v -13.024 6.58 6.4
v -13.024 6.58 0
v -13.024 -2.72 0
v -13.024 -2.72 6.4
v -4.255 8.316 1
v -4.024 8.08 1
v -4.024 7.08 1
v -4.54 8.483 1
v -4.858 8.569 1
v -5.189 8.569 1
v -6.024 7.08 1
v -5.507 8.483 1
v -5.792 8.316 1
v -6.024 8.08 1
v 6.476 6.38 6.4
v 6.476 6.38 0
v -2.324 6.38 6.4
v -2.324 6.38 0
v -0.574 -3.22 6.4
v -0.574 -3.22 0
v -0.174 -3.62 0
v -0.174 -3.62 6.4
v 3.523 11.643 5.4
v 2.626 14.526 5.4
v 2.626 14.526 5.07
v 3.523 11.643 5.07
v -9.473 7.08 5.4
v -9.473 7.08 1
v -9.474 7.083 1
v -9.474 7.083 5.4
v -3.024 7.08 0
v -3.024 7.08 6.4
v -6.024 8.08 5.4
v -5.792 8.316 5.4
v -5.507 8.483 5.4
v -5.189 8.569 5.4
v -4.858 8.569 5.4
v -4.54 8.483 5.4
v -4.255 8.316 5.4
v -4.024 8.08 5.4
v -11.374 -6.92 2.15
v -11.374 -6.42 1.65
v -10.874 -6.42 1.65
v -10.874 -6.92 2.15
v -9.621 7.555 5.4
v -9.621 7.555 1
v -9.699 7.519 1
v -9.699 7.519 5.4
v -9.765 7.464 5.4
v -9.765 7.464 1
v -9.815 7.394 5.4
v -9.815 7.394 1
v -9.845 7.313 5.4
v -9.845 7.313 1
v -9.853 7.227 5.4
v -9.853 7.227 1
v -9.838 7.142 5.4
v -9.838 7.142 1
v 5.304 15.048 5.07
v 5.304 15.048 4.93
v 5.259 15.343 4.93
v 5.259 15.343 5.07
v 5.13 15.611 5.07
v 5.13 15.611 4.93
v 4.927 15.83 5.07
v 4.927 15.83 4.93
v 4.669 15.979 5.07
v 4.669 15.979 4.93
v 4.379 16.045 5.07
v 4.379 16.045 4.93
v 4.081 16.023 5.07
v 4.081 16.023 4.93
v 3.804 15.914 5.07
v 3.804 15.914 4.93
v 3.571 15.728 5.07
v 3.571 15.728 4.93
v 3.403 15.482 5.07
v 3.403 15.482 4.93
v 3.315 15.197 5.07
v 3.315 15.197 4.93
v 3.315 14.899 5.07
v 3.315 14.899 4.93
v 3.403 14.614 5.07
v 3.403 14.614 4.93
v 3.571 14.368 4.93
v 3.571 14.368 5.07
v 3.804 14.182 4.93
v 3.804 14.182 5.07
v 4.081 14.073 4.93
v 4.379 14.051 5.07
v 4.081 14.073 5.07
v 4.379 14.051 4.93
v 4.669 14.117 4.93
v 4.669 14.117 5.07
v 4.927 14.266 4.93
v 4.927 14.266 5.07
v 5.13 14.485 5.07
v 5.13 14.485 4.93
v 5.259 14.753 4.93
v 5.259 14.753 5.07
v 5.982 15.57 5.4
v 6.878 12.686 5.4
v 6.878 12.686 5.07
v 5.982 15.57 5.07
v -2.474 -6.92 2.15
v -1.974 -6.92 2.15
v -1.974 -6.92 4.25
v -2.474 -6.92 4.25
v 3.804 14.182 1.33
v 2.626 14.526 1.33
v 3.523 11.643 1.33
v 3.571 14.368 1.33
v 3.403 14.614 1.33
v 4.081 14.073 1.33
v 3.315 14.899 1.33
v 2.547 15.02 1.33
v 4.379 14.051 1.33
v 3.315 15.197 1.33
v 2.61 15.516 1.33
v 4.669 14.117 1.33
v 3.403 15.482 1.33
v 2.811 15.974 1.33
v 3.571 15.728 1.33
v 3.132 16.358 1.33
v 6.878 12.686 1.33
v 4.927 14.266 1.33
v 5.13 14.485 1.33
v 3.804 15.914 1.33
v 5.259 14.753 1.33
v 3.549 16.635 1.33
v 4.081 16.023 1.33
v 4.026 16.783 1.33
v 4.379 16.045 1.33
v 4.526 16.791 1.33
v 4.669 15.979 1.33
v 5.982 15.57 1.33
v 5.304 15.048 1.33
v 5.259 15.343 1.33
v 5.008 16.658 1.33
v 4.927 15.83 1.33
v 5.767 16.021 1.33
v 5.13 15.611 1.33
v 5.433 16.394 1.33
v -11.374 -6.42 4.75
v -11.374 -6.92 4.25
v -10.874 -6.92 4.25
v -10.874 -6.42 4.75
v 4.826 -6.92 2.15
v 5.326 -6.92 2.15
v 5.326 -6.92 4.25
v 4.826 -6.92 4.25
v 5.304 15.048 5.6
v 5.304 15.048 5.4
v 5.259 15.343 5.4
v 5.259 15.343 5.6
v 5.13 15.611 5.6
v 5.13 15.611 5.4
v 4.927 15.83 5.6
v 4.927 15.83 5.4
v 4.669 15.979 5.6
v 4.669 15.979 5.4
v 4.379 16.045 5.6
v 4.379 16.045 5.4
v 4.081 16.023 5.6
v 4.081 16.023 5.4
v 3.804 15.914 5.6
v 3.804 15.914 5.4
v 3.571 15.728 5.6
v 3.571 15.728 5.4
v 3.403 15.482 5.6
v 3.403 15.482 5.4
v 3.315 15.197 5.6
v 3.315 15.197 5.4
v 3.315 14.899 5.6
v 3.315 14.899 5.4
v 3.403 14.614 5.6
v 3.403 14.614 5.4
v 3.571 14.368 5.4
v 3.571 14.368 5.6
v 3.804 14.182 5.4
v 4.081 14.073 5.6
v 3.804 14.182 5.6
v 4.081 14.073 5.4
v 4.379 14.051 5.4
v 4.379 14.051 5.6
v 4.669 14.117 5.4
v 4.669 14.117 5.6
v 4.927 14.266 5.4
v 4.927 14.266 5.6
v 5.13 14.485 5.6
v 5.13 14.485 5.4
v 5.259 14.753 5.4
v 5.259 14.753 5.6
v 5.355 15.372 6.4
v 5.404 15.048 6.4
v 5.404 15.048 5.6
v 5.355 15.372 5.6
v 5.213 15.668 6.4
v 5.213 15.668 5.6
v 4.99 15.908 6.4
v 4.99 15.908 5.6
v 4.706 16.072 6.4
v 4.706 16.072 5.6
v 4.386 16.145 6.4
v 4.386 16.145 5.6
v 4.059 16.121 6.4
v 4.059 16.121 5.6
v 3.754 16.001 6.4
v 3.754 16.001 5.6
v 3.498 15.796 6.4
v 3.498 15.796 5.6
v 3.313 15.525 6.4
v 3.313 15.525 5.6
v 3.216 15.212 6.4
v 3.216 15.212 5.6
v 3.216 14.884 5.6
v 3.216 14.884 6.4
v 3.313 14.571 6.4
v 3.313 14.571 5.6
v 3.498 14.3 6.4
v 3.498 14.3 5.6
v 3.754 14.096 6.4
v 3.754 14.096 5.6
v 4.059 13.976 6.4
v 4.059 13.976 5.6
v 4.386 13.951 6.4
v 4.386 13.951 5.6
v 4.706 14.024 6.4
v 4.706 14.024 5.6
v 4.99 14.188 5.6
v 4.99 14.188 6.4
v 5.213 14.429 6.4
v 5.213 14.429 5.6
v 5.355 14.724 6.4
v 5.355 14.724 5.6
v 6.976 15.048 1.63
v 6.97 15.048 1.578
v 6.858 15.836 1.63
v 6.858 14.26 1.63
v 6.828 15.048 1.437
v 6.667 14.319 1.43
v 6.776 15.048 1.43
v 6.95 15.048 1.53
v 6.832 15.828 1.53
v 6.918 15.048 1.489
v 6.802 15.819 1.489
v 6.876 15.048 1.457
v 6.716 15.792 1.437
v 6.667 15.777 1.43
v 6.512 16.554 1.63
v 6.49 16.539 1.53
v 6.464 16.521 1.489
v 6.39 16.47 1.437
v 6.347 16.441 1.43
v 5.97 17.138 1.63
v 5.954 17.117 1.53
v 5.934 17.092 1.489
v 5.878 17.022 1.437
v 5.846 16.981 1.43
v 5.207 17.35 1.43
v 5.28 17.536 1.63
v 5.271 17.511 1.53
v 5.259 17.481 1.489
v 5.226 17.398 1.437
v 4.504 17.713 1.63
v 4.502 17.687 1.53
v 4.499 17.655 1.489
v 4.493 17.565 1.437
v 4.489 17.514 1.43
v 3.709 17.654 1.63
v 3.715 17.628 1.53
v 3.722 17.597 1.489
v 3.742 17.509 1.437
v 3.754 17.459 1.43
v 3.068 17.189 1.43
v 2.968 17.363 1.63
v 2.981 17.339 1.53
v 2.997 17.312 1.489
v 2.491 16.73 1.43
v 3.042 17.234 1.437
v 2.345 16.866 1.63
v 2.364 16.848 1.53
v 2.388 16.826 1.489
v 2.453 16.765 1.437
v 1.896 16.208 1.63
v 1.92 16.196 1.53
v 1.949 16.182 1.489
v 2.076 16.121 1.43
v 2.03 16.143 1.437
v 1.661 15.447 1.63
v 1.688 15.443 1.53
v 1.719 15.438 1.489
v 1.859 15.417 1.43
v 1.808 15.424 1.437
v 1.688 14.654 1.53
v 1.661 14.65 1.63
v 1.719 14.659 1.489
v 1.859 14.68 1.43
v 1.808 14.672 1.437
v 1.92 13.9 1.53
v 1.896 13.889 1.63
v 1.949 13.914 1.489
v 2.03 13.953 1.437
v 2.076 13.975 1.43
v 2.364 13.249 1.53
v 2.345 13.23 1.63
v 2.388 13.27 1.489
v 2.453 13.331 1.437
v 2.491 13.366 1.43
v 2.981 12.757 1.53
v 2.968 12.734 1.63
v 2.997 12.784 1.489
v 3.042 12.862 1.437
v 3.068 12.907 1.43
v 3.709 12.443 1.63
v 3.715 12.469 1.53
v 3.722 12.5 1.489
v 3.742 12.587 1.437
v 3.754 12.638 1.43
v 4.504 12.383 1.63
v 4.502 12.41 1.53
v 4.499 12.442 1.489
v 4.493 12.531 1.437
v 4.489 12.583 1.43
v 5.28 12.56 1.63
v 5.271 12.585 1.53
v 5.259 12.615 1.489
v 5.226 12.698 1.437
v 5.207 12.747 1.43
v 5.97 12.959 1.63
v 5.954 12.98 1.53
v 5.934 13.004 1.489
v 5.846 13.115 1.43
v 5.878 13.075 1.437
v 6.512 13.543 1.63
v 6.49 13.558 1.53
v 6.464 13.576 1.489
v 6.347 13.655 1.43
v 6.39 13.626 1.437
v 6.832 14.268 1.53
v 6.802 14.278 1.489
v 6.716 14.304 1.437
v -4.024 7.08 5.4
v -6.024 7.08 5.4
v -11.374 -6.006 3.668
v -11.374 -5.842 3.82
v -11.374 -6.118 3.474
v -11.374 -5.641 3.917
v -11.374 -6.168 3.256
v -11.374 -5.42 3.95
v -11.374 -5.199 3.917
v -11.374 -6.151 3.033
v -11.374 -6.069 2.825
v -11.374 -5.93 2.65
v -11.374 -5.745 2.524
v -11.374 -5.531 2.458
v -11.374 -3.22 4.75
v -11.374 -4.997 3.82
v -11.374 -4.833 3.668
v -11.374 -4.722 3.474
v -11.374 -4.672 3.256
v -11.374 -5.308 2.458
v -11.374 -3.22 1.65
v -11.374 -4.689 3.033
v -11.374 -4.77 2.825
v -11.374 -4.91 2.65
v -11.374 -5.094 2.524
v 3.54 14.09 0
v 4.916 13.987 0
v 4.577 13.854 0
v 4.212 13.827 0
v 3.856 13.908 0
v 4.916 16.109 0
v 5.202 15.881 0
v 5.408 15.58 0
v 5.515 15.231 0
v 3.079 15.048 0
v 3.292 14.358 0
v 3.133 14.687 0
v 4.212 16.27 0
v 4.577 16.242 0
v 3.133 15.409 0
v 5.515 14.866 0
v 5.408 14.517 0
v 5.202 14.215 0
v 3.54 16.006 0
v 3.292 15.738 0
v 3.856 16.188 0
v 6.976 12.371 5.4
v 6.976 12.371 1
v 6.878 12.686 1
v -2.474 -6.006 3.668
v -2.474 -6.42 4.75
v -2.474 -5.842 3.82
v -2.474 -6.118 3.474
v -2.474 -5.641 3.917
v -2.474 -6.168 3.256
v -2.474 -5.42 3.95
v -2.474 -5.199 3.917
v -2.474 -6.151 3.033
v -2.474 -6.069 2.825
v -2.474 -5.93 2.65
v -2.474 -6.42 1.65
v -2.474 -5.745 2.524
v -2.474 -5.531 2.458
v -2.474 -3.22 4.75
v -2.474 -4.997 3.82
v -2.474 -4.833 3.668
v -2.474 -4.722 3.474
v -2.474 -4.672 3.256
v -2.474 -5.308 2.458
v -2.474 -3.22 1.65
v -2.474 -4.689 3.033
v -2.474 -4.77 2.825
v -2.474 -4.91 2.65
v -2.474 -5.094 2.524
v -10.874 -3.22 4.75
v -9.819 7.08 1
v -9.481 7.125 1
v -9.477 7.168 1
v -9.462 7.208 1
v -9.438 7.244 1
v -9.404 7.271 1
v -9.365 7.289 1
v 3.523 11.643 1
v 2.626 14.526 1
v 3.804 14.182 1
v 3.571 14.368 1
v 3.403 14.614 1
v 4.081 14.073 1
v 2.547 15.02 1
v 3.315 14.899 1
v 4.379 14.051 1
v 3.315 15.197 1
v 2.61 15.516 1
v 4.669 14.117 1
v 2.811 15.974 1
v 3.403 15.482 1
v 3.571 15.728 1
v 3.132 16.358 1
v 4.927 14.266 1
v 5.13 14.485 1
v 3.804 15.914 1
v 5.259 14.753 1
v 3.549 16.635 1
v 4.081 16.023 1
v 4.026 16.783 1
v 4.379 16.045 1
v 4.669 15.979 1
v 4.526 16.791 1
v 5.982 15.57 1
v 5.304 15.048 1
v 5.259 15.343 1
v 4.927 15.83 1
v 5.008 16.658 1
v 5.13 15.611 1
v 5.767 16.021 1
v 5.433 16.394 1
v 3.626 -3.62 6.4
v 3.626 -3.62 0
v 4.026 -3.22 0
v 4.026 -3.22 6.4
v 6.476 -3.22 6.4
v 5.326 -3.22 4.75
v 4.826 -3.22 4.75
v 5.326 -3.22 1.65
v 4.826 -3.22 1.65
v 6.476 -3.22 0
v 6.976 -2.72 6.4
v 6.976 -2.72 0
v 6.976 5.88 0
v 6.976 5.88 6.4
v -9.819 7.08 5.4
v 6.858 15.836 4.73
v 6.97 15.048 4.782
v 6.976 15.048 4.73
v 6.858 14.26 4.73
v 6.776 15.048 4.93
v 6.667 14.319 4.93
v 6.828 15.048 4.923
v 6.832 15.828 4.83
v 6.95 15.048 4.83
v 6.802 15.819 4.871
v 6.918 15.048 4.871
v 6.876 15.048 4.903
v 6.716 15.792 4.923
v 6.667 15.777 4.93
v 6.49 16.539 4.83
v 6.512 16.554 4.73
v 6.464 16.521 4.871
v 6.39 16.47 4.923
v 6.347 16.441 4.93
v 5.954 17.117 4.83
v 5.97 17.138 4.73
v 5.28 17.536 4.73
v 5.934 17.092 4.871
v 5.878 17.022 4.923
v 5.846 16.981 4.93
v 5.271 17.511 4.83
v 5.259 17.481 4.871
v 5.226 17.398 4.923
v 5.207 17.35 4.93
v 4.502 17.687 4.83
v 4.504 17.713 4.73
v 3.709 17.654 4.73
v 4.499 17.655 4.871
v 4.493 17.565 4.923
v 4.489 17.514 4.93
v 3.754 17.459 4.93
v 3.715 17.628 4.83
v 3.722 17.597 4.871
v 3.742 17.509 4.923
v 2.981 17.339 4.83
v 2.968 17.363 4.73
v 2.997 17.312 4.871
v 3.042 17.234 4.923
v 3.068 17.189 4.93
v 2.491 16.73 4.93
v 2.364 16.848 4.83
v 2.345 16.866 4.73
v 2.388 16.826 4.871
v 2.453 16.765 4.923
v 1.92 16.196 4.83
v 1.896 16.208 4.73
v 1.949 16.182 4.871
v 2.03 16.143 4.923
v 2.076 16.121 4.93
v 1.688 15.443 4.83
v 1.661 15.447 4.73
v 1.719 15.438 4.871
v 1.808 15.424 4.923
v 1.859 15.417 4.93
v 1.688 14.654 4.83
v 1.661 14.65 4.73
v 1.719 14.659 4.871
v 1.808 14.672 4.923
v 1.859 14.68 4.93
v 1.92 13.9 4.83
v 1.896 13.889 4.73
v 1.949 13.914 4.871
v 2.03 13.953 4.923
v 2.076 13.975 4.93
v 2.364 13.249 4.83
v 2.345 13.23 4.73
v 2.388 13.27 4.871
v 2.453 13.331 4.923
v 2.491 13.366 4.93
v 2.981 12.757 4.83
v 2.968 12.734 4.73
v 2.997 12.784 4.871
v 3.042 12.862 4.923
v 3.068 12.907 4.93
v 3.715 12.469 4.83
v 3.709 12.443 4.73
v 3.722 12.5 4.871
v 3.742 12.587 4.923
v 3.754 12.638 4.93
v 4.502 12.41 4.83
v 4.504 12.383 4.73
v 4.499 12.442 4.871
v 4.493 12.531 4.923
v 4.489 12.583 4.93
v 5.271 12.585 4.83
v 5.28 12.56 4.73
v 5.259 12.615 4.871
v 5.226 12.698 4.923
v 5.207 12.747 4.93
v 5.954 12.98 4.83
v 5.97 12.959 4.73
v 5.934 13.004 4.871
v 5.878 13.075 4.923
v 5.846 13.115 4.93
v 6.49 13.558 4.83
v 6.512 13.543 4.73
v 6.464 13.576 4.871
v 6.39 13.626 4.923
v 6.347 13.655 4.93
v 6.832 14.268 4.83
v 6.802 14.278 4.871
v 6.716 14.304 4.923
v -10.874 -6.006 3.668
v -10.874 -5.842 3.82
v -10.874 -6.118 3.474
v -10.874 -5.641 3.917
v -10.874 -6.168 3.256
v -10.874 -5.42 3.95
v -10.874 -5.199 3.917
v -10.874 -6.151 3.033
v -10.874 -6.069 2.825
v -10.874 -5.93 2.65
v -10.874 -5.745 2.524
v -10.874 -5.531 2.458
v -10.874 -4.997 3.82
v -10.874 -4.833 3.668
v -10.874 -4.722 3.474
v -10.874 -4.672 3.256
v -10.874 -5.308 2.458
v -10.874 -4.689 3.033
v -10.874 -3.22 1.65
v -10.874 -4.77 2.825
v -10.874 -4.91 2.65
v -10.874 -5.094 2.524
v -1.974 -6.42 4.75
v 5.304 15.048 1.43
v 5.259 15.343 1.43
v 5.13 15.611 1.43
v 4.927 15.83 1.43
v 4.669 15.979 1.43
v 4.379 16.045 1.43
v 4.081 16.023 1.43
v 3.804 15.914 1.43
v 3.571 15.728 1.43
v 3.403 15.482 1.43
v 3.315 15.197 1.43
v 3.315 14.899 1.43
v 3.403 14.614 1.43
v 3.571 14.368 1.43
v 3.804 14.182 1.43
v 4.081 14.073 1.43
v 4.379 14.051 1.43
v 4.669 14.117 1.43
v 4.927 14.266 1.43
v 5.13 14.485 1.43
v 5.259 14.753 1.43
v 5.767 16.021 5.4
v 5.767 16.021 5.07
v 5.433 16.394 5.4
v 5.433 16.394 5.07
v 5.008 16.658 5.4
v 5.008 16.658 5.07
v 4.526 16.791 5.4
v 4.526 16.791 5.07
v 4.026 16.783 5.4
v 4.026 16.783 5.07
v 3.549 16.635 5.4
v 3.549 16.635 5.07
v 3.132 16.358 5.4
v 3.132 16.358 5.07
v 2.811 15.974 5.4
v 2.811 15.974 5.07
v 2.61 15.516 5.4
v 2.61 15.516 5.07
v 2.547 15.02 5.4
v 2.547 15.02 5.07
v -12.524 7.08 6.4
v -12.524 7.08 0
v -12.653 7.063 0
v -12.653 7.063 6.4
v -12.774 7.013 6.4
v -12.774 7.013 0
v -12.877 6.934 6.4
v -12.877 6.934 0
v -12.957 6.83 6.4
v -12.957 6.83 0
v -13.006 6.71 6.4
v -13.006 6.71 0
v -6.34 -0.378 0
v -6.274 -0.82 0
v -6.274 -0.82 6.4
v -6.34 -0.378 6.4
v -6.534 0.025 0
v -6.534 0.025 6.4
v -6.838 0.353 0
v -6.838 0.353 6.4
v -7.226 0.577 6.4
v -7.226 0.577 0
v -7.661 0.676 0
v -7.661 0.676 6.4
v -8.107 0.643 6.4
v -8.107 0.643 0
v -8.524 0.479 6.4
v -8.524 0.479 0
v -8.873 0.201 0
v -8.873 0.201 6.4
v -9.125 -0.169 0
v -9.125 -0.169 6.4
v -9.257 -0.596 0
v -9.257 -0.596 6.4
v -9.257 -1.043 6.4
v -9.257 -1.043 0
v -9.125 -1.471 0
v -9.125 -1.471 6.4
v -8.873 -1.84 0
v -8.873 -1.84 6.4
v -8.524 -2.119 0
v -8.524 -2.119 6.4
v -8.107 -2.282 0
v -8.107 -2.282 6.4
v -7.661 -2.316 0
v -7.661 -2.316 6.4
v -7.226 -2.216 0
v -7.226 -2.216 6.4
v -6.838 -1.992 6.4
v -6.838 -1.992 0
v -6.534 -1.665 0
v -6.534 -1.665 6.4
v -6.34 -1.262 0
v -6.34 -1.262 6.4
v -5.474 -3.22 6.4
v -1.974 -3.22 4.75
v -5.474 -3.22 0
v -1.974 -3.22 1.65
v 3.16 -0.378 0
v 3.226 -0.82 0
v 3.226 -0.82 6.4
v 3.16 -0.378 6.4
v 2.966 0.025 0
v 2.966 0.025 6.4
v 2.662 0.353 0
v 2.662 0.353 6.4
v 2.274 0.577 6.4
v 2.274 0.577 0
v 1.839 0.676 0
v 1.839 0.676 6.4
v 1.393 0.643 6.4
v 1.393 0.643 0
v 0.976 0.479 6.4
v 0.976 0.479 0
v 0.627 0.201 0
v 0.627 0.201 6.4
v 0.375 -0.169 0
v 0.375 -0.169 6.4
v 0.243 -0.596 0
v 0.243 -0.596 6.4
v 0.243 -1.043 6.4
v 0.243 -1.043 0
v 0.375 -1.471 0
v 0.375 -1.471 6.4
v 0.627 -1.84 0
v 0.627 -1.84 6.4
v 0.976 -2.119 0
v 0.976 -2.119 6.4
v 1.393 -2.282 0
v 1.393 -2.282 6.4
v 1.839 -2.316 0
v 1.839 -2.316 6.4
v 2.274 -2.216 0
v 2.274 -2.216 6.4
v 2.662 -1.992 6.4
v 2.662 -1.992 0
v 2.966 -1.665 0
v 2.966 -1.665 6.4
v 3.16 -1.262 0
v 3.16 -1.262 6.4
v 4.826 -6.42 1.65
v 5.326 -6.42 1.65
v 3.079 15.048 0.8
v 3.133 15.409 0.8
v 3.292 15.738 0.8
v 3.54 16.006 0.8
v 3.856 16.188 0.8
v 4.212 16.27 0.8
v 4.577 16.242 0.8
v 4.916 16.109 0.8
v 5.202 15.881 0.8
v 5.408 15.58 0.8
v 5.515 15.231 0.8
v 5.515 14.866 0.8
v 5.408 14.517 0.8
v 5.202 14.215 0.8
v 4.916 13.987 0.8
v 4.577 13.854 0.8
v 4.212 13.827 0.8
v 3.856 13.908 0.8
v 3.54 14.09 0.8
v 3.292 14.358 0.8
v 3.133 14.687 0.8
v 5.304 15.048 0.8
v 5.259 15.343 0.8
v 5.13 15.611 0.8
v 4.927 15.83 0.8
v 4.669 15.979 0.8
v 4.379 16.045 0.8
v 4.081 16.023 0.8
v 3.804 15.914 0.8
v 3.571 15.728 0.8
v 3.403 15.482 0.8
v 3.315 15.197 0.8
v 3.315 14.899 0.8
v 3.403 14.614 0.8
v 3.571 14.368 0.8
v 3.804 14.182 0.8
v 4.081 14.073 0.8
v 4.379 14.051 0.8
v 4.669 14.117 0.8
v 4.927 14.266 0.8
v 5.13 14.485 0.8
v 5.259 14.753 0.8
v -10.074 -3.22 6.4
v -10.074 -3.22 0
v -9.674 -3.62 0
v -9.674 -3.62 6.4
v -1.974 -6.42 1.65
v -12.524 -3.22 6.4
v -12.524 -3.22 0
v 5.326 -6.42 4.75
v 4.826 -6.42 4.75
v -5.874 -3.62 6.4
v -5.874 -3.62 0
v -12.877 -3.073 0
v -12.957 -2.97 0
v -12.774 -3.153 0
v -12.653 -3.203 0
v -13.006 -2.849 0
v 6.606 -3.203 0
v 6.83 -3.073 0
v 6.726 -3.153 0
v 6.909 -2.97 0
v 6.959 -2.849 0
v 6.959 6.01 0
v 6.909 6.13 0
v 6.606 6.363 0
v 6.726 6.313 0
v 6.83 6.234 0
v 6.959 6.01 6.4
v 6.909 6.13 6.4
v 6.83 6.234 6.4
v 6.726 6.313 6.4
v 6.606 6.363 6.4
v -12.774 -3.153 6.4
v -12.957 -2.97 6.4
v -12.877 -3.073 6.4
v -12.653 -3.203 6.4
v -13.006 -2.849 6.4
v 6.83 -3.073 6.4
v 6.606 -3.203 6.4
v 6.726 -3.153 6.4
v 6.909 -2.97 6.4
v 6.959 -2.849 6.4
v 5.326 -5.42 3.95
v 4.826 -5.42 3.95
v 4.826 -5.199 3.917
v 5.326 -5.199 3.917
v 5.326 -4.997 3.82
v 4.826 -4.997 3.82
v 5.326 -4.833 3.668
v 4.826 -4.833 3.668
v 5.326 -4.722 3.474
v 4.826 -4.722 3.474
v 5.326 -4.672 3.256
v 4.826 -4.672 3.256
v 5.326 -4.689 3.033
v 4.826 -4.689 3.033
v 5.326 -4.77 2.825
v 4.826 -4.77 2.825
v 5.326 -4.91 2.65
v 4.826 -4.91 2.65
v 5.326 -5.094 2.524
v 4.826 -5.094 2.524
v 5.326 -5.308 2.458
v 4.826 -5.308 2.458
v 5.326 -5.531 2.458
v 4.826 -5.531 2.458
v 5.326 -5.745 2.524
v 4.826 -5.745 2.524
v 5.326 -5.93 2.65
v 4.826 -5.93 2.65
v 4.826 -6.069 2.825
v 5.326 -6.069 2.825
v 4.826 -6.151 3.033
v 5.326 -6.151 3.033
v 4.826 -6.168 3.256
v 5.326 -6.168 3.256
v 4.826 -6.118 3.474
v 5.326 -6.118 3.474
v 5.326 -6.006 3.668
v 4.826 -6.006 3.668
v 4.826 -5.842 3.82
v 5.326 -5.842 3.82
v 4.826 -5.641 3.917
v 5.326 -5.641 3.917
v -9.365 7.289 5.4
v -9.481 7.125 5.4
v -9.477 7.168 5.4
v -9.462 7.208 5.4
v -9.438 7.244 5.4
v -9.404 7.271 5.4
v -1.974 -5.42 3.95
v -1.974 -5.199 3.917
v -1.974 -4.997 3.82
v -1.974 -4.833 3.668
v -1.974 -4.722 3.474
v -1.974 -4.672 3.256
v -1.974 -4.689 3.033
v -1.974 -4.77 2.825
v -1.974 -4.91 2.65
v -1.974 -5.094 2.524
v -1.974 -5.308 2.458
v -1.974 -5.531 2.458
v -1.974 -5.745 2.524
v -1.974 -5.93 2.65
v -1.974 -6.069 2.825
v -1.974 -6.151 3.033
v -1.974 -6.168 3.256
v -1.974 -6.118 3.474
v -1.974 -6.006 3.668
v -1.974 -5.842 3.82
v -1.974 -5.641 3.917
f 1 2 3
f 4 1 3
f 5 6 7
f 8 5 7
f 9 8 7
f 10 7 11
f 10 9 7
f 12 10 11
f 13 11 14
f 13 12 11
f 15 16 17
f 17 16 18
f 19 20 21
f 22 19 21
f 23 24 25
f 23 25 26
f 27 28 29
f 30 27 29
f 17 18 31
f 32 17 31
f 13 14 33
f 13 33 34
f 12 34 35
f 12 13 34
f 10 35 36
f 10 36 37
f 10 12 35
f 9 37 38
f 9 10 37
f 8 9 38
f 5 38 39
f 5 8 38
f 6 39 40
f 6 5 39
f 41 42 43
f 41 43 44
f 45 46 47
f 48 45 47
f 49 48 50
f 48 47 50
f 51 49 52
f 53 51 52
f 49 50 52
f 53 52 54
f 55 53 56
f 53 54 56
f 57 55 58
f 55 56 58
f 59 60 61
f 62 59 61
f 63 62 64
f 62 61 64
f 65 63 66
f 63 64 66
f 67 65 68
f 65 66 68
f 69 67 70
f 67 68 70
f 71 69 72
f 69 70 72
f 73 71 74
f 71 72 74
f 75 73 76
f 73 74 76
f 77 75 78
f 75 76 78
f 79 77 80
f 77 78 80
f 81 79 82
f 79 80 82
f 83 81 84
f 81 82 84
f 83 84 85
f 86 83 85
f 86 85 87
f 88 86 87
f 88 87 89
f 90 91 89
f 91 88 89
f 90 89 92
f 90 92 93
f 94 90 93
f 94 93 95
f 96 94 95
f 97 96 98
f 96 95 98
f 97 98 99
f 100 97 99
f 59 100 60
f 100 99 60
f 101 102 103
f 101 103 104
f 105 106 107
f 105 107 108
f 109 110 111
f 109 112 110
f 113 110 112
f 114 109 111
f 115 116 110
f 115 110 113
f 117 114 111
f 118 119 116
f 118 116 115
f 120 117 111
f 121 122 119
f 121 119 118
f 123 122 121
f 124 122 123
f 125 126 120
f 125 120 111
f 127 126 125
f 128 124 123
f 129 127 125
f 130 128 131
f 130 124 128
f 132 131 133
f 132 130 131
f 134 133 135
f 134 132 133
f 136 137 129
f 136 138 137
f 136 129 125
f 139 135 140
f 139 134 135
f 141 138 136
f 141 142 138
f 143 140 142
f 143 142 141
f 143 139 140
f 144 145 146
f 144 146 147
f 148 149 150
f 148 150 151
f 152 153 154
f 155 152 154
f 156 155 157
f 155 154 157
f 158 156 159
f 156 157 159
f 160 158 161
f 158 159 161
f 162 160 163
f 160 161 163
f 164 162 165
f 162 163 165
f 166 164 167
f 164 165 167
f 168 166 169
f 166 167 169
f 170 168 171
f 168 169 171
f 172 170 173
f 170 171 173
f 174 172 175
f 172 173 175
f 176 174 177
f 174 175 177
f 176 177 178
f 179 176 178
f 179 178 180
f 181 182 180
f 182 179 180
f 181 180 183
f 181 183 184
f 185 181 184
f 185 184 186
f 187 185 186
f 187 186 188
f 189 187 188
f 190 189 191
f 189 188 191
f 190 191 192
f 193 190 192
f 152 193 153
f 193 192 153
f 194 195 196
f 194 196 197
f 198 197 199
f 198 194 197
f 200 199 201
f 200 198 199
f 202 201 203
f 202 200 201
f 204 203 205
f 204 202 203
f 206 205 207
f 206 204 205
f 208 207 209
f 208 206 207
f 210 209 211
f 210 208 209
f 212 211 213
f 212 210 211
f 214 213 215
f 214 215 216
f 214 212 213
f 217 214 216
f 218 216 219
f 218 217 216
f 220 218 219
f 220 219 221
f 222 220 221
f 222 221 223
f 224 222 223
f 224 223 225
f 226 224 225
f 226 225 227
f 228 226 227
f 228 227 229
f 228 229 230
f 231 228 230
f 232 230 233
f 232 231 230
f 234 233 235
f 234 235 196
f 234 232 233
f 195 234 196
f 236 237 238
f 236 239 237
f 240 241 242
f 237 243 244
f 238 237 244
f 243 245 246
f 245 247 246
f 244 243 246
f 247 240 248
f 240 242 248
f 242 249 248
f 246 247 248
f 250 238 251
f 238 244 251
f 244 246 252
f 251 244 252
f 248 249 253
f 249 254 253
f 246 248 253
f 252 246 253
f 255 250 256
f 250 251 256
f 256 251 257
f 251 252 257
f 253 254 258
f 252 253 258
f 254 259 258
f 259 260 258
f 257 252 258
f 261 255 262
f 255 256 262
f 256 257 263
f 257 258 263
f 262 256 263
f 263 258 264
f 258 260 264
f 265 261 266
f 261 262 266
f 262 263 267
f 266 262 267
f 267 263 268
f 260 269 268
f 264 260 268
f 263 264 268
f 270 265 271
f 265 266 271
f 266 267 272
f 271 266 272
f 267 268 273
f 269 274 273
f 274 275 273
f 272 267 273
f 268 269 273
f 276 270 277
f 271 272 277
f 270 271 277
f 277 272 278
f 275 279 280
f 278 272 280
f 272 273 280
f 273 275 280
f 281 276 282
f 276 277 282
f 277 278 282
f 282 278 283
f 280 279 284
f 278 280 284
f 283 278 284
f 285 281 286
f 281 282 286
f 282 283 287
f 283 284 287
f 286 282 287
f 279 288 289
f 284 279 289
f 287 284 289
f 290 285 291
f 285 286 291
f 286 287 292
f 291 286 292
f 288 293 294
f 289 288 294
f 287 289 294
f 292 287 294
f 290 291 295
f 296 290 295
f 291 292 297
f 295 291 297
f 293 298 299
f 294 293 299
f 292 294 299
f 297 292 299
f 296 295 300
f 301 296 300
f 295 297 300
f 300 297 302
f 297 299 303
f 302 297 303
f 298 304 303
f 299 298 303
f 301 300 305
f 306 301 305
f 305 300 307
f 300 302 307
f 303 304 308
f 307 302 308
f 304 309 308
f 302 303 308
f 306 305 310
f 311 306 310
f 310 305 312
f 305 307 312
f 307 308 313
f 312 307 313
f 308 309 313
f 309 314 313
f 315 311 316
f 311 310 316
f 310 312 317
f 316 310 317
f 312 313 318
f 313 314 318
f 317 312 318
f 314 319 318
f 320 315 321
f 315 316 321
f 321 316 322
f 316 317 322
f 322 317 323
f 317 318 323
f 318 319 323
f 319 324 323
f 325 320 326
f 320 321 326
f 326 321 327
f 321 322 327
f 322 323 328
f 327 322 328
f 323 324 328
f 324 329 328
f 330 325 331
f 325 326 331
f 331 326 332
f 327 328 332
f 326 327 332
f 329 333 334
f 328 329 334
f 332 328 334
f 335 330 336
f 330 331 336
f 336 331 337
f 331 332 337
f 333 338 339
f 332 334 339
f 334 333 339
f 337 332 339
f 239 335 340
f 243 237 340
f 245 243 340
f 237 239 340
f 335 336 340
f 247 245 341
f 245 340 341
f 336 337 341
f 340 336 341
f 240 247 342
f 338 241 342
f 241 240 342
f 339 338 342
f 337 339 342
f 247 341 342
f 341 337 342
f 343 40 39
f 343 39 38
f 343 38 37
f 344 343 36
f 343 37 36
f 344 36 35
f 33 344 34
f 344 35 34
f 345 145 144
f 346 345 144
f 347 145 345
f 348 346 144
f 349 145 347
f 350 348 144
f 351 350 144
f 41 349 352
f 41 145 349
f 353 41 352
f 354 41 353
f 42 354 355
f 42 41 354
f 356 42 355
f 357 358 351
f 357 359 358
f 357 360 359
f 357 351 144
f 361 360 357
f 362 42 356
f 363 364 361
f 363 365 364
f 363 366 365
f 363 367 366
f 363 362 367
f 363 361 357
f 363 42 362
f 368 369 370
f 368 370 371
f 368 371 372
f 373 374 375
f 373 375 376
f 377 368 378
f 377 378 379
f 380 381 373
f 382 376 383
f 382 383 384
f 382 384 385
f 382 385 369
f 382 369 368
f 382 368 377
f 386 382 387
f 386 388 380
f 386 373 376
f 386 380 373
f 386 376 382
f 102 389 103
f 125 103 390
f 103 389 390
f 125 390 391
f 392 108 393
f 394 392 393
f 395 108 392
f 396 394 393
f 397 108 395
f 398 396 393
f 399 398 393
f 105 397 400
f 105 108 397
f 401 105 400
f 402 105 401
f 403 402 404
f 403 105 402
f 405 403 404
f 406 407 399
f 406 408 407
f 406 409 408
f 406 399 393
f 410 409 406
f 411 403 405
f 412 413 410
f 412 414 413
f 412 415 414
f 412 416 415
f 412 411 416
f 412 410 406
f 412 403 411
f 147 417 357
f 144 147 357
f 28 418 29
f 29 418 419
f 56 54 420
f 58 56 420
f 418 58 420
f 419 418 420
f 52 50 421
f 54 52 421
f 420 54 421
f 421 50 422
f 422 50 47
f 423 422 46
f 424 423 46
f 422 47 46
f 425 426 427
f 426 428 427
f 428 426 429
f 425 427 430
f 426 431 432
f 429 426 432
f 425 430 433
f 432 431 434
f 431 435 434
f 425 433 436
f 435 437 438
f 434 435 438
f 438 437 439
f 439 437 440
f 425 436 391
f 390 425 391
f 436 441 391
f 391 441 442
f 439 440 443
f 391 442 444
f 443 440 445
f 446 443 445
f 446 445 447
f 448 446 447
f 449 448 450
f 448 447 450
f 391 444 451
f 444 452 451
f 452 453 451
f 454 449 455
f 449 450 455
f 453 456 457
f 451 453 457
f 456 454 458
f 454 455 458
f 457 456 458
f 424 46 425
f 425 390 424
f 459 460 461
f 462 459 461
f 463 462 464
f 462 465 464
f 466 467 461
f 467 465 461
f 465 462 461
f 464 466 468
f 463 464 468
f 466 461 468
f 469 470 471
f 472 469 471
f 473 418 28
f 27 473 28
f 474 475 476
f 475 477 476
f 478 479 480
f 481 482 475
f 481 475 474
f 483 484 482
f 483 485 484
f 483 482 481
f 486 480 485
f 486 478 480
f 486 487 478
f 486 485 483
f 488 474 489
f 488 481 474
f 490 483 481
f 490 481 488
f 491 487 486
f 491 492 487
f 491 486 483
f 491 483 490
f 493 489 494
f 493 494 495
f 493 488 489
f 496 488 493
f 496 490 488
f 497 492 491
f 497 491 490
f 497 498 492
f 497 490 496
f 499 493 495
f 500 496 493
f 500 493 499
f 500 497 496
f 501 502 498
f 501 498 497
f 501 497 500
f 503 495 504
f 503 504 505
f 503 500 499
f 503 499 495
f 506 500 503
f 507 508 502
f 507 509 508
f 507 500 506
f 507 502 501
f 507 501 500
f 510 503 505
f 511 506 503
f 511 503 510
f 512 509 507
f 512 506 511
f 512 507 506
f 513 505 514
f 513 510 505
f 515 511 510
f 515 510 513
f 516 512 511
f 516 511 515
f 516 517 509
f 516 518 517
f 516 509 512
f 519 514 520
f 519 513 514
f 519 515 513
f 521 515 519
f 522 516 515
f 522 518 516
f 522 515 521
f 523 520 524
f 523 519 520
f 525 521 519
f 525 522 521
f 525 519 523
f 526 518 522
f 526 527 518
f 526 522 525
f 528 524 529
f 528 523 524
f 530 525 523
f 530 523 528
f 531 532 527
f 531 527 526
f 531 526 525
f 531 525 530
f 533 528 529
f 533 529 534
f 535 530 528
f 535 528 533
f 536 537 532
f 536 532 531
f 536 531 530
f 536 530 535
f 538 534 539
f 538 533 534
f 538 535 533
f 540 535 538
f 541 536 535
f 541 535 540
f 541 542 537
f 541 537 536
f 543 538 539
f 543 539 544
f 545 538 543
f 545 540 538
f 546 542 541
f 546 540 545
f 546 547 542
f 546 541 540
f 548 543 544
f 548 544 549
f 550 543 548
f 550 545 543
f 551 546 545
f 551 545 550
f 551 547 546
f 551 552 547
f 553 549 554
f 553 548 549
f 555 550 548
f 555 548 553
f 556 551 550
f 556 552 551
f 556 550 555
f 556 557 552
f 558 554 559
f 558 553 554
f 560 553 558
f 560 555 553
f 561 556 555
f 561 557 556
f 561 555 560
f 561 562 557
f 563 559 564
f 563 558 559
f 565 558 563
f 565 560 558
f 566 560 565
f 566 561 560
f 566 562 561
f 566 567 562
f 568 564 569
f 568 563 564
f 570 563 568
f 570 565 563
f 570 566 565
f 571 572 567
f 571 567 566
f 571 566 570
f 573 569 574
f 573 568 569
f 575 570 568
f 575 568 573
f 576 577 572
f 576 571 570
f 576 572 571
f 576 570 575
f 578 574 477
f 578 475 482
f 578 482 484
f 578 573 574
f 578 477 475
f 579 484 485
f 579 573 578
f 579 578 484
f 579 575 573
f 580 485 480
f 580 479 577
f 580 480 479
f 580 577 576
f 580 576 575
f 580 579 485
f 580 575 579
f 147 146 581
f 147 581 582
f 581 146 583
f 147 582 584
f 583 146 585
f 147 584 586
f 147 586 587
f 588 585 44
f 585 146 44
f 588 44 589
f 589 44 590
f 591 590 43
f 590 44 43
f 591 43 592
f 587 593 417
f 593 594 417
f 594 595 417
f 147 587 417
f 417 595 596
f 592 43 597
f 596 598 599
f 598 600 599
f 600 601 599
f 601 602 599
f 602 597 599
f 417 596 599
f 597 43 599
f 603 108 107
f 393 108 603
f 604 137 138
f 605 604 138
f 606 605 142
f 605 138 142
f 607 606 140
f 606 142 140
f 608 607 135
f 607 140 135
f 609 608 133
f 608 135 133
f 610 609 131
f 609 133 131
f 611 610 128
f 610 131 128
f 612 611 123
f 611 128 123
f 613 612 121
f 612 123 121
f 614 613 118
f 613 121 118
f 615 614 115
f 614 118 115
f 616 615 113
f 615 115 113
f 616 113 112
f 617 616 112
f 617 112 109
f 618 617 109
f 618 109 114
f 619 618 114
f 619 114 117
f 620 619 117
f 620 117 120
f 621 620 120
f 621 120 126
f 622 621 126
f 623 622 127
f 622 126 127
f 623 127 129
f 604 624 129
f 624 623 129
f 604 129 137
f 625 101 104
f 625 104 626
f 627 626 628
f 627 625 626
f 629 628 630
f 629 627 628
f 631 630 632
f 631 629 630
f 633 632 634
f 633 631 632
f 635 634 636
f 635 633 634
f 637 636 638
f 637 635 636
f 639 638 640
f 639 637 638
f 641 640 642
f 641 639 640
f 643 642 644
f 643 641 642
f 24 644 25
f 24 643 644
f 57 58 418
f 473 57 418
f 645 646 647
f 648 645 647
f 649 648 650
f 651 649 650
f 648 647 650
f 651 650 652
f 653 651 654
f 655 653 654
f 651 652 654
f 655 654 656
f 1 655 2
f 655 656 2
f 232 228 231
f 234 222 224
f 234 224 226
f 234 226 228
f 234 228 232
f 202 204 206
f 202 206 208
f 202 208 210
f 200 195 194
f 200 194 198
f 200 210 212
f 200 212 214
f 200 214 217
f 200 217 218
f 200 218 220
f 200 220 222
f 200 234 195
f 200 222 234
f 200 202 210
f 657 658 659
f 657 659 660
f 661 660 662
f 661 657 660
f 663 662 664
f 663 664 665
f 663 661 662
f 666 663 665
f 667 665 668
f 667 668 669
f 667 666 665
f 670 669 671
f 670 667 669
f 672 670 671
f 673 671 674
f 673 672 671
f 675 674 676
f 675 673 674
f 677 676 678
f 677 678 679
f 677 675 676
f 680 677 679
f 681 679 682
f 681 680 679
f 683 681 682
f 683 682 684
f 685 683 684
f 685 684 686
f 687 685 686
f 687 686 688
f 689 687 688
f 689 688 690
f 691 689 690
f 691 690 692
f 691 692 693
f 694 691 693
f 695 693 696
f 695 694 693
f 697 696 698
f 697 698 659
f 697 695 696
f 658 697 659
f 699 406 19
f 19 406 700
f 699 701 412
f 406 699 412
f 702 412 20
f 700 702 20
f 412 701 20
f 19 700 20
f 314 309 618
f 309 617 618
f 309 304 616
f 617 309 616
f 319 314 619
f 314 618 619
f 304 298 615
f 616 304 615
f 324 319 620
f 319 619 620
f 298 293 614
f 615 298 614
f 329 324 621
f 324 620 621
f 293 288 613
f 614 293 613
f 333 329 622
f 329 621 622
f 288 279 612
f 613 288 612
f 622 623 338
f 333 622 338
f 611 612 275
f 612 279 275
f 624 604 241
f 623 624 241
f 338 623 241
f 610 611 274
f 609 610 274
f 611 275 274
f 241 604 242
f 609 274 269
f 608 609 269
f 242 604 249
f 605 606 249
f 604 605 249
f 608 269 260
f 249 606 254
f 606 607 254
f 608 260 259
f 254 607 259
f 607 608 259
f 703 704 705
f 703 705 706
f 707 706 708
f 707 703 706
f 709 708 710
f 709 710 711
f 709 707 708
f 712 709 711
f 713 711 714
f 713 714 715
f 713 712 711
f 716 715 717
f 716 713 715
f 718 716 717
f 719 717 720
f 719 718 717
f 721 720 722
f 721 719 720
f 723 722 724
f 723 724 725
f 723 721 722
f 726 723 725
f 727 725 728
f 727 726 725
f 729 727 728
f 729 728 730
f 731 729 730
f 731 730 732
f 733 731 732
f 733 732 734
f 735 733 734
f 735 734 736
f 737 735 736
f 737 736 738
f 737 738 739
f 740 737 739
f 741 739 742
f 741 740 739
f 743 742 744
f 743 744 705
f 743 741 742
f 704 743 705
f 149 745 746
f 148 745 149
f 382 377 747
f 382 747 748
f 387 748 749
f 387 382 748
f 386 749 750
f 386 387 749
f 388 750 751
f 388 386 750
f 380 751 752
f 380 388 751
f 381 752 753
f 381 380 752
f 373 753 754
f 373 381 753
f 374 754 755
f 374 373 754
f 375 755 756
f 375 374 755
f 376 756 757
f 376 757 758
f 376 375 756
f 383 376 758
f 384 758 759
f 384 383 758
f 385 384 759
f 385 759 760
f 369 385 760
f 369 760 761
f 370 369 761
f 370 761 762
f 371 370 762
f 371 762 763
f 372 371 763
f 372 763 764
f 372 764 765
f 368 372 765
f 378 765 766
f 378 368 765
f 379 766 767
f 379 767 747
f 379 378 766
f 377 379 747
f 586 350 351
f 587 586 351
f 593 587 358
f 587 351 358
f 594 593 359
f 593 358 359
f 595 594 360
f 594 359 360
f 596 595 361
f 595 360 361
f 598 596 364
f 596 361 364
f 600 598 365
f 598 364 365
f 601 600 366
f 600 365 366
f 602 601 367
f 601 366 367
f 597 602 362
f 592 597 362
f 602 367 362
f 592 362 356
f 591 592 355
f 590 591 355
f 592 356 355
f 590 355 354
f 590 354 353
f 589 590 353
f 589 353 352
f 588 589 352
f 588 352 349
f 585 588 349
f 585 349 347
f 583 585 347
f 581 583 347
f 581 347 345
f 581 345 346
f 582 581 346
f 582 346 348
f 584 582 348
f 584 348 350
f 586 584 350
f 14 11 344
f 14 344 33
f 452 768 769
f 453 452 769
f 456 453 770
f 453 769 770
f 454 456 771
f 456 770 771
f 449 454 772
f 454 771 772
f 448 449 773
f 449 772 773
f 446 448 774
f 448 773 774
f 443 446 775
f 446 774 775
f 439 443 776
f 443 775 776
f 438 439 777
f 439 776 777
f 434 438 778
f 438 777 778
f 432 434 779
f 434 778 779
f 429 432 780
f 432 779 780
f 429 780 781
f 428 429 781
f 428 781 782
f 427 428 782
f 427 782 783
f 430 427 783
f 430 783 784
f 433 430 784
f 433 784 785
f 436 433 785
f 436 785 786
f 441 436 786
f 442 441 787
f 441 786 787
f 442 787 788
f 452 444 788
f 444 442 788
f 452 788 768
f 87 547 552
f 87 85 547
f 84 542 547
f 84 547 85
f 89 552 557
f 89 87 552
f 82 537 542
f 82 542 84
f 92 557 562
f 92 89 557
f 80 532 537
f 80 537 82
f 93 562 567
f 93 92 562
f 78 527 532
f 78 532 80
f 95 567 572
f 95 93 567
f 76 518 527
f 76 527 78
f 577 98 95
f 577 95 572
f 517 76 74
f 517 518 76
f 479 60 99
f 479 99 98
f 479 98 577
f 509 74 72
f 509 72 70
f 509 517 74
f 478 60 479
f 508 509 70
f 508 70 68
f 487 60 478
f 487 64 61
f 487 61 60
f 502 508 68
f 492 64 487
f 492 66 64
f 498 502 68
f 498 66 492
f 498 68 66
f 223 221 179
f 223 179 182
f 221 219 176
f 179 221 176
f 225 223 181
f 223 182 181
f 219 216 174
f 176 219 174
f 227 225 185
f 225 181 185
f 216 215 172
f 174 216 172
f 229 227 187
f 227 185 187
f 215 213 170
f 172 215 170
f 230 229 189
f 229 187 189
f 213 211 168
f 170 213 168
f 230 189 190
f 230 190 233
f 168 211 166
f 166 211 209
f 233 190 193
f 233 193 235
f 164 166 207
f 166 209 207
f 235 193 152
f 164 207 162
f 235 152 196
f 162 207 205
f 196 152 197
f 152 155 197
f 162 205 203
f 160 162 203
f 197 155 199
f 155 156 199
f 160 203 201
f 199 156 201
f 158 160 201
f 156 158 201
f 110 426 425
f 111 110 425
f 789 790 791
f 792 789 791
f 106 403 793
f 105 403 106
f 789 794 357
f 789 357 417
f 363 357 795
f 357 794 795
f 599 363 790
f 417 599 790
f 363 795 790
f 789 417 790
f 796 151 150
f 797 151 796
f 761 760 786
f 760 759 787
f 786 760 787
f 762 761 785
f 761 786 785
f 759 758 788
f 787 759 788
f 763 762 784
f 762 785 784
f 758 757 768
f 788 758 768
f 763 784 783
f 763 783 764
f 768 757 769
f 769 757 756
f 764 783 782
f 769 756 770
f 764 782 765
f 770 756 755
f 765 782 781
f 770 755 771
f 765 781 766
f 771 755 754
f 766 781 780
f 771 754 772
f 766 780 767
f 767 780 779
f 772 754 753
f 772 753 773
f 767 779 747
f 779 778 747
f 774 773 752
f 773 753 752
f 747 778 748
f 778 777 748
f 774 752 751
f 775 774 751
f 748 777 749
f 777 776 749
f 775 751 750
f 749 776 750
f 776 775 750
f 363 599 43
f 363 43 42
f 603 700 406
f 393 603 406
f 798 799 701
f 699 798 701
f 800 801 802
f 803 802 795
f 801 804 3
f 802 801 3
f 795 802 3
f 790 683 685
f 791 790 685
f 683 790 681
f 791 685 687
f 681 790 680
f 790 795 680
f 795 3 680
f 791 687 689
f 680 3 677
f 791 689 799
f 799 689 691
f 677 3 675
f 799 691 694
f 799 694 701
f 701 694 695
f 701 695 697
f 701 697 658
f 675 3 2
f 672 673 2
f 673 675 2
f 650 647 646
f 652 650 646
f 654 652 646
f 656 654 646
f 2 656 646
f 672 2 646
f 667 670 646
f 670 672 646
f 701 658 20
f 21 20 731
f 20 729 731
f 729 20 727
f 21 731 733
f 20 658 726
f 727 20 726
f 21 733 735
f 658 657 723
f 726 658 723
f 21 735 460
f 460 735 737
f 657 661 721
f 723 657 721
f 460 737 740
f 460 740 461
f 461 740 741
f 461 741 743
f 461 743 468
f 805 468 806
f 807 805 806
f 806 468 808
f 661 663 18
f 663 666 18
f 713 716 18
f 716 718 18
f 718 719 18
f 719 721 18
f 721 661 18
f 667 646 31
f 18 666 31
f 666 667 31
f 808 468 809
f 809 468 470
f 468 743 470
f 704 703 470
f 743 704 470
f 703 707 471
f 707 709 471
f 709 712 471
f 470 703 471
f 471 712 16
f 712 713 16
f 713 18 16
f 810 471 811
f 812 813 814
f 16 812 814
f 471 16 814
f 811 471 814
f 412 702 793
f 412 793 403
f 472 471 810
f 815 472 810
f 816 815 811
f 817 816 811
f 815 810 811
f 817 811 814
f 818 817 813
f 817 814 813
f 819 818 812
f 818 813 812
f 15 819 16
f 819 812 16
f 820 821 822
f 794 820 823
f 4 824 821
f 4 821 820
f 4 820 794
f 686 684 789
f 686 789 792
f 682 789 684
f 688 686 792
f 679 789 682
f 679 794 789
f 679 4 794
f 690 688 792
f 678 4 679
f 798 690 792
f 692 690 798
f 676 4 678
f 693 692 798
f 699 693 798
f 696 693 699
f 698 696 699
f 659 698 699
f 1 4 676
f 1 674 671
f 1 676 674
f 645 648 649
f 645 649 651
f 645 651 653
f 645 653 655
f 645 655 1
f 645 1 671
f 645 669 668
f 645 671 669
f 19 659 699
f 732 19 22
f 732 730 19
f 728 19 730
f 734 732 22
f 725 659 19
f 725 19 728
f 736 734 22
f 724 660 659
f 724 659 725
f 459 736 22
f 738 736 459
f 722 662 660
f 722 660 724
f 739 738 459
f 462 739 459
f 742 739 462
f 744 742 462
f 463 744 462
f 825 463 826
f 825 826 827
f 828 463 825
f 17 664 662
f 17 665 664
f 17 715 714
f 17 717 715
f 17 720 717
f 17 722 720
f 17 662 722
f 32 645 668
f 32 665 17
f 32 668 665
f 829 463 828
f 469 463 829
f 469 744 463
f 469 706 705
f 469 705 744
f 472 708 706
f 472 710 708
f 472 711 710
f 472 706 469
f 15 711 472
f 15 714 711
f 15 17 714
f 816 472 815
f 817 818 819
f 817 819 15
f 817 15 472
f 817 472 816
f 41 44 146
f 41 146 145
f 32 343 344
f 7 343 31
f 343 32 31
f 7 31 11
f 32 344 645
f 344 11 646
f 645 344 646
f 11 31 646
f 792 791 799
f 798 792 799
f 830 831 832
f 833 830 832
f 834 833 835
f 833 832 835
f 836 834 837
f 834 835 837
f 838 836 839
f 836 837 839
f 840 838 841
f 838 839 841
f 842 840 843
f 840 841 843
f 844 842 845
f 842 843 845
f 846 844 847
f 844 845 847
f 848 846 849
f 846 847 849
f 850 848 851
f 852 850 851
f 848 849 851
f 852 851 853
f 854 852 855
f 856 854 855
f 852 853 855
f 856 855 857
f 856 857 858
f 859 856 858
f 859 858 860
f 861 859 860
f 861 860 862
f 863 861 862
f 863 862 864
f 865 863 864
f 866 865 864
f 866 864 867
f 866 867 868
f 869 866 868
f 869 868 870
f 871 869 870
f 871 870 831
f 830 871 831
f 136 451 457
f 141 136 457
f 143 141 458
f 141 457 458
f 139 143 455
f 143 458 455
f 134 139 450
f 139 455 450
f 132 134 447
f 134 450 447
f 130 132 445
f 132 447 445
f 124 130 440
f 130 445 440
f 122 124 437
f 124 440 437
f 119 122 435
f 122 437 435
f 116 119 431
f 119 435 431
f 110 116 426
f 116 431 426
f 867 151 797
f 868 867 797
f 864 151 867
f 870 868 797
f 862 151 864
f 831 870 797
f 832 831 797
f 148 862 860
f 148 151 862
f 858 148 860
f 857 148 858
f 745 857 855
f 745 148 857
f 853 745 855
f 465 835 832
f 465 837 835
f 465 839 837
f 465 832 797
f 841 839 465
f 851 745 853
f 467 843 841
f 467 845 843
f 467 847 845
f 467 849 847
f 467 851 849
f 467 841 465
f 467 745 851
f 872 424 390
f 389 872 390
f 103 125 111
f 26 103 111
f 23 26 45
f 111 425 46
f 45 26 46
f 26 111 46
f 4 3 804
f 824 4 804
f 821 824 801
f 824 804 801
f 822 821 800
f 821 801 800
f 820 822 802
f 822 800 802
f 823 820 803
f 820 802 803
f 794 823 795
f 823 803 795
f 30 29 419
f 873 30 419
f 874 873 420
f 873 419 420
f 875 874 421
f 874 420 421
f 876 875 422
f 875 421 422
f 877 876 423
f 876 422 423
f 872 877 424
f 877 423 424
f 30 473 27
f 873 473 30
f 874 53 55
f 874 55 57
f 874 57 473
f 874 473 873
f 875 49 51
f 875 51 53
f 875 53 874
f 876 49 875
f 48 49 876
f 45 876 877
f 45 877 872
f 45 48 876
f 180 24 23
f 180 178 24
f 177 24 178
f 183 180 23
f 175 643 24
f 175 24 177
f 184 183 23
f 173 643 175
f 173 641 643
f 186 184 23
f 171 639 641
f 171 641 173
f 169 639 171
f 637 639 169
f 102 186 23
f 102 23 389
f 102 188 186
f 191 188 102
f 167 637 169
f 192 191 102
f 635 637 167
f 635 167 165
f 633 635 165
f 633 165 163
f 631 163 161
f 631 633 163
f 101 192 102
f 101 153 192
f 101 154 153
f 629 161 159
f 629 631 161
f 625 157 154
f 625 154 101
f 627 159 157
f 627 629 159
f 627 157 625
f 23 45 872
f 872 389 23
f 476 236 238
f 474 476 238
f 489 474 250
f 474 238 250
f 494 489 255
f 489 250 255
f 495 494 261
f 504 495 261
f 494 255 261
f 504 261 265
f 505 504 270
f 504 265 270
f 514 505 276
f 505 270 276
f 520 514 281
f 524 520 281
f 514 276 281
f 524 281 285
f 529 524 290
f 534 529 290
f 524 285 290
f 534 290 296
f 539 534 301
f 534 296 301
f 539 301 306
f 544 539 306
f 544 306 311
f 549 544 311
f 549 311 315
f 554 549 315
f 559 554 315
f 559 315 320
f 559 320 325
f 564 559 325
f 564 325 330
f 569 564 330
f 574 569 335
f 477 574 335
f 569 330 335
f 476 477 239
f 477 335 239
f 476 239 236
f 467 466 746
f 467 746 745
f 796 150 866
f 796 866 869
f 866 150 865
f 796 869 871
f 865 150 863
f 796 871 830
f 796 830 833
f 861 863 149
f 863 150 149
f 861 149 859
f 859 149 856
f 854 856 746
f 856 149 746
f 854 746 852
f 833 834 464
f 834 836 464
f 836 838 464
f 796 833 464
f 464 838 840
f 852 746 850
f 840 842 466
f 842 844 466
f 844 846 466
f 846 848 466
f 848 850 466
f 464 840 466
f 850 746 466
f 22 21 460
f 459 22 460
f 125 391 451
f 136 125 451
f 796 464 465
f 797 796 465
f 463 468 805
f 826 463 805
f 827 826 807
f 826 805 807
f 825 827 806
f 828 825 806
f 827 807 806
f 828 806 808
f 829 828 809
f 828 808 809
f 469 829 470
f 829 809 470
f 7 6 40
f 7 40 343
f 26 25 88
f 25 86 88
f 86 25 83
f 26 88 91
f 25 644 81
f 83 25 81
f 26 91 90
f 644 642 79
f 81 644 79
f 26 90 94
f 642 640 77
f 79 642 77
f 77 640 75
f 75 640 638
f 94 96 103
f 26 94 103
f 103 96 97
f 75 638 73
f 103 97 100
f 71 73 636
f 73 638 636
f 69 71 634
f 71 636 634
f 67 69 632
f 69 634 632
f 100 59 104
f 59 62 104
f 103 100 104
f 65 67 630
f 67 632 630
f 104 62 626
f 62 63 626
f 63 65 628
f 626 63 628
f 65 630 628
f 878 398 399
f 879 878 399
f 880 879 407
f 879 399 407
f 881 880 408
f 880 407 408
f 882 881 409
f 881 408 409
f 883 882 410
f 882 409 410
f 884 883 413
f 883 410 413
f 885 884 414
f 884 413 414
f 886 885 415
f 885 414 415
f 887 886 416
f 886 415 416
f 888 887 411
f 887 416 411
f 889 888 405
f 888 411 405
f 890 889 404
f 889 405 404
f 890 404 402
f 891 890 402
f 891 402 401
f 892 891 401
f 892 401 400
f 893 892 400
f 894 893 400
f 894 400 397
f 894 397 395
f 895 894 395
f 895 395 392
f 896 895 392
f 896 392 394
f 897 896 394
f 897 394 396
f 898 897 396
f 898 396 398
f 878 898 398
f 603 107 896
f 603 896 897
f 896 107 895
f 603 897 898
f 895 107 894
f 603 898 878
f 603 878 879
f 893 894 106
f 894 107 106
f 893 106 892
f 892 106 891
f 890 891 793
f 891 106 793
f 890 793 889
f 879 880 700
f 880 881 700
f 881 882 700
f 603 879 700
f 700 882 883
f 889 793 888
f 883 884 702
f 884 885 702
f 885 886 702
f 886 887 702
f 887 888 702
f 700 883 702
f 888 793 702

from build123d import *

# Parameters (mm, degrees)
ESBO_O2_R                 = 1.5
RESSALTO_EXTRUS_O1_DEPTH  = 6.4
RESSALTO_EXTRUS_O2_DEPTH  = 4.4
ESBO_O4_W                 = 0.5
ESBO_O4_H                 = 3.7
RESSALTO_EXTRUS_O4_DEPTH  = 3.1
ESBO_O6_R                 = 0.75
CORTE_EXTRUS_O1_DEPTH     = 23.1
RESSALTO_EXTRUS_O15_DEPTH = 4.4
RESSALTO_EXTRUS_O16_DEPTH = 0.33
RESSALTO_EXTRUS_O17_DEPTH = 0.33
RESSALTO_EXTRUS_O18_START = -6.4
ESBO_O10_R                = 1
RESSALTO_EXTRUS_O18_DEPTH = 6.4
ESBO_O11_R                = 1.225
RESSALTO_EXTRUS_O19_DEPTH = 0.8
ESBO_O12_R                = 1.1
RESSALTO_EXTRUS_O20_DEPTH = 0.8
ESBO_O13_R                = 2.672557582
RESSALTO_EXTRUS_O21_DEPTH = 3.5
FILETE1_R                 = 0.2


with BuildPart() as part:
    # Esboço2 → Ressalto-extrusão1 (new body)
    with BuildSketch(Plane.XY):
        with BuildLine():
            Line((4.026483681, -3.219711224), (6.476483681, -3.219711224))
            ThreePointArc((6.476483681, -3.219711224), (6.830037072, -3.073264614), (6.976483681, -2.719711224))
            Line((6.976483681, -2.719711224), (6.976483681, 5.880288776))
            ThreePointArc((6.976483681, 5.880288776), (6.830037072, 6.233842167), (6.476483681, 6.380288776))
            Line((6.476483681, 6.380288776), (-2.323516319, 6.380288776))
            Line((-2.323516319, 6.380288776), (-3.023516319, 7.080288776))
            Line((-3.023516319, 7.080288776), (-12.523516319, 7.080288776))
            ThreePointArc((-12.523516319, 7.080288776), (-12.877069709, 6.933842167), (-13.023516319, 6.580288776))
            Line((-13.023516319, 6.580288776), (-13.023516319, -2.719711224))
            ThreePointArc((-13.023516319, -2.719711224), (-12.877069709, -3.073264614), (-12.523516319, -3.219711224))
            Line((-12.523516319, -3.219711224), (-10.073516319, -3.219711224))
            Line((-10.073516319, -3.219711224), (-9.673516319, -3.619711224))
            Line((-9.673516319, -3.619711224), (-5.873516319, -3.619711224))
            Line((-5.873516319, -3.619711224), (-5.473516319, -3.219711224))
            Line((-5.473516319, -3.219711224), (-0.573516319, -3.219711224))
            Line((-0.573516319, -3.219711224), (-0.173516319, -3.619711224))
            Line((-0.173516319, -3.619711224), (3.626483681, -3.619711224))
            Line((3.626483681, -3.619711224), (4.026483681, -3.219711224))
        make_face()
        with Locations((1.726483681, -0.819711224)):
            Circle(ESBO_O2_R, mode=Mode.SUBTRACT)
        with Locations((-7.773516319, -0.819711224)):
            Circle(ESBO_O2_R, mode=Mode.SUBTRACT)
    extrude(amount=RESSALTO_EXTRUS_O1_DEPTH)

    # Esboço3 → Ressalto-extrusão2 (add)
    with BuildSketch(Plane(origin=(0, 0, 1), x_dir=(-1, 0, 0), z_dir=(0, 0, -1))):
        with BuildLine():
            Line((4.023516319, 7.080288776), (6.023516319, 7.080288776))
            Line((6.023516319, 7.080288776), (6.023516319, 8.080288776))
            ThreePointArc((6.023516319, 8.080288776), (5.023516319, 8.580288776), (4.023516319, 8.080288776))
            Line((4.023516319, 8.080288776), (4.023516319, 7.080288776))
        make_face()
    extrude(amount=-RESSALTO_EXTRUS_O2_DEPTH)

    # Esboço4 → Ressalto-extrusão4 (add)
    with BuildSketch(Plane(origin=(0, 0, 1.65), x_dir=(-1, 0, 0), z_dir=(0, 0, -1))):
        with Locations((11.123516319, -5.069711224)):
            Rectangle(ESBO_O4_W, ESBO_O4_H)
        with Locations((2.223516319, -5.069711224)):
            Rectangle(ESBO_O4_W, ESBO_O4_H)
        with Locations((-5.076483681, -5.069711224)):
            Rectangle(ESBO_O4_W, ESBO_O4_H)
    extrude(amount=-RESSALTO_EXTRUS_O4_DEPTH)

    # Esboço6 → Corte-extrusão1 (cut)
    with BuildSketch(Plane.ZY.offset(11.373516319)):
        with Locations((3.2, -5.419711224)):
            Circle(ESBO_O6_R)
        Polygon((1.65, -6.419711224), (2.15, -6.919711224), (4.25, -6.919711224), (4.75, -6.419711224), (4.75, -4.307213544), (5.418573978, -4.307213544), (5.418573978, -7.77930336), (0.93735461, -7.77930336), (0.93735461, -4.307213544), (1.65, -4.307213544), align=None)
    extrude(amount=-CORTE_EXTRUS_O1_DEPTH, mode=Mode.SUBTRACT)


with BuildPart() as body_2:
    # Esboço7 → Ressalto-extrusão15 (new body)
    with BuildSketch(Plane(origin=(0, 0, 1), x_dir=(-1, 0, 0), z_dir=(0, 0, -1))):
        with BuildLine():
            Line((9.365374351, 7.289132915), (-6.976483681, 12.37101291))
            Line((-6.976483681, 12.37101291), (-6.878491341, 12.68612797))
            Line((-6.878491341, 12.68612797), (9.620924222, 7.555251805))
            ThreePointArc((9.620924222, 7.555251805), (9.815042925, 7.393665692), (9.838046941, 7.142144404))
            Line((9.838046941, 7.142144404), (9.818811498, 7.080288776))
            Line((9.818811498, 7.080288776), (9.473223446, 7.080288776))
            Line((9.473223446, 7.080288776), (9.473935711, 7.082579215))
            ThreePointArc((9.473935711, 7.082579215), (9.462433703, 7.208339859), (9.365374351, 7.289132915))
        make_face()
    extrude(amount=-RESSALTO_EXTRUS_O15_DEPTH)

    # Esboço8 → Ressalto-extrusão16 (add)
    with BuildSketch(Plane(origin=(0, 0, 1), x_dir=(-1, 0, 0), z_dir=(0, 0, -1))):
        with BuildLine():
            Line((-3.522926038, 11.642637068), (-6.878491341, 12.68612797))
            Line((-6.878491341, 12.68612797), (-5.981708751, 15.569921721))
            ThreePointArc((-5.981708751, 15.569921721), (-3.782180648, 16.725958922), (-2.626143448, 14.526430819))
            Line((-2.626143448, 14.526430819), (-3.522926038, 11.642637068))
        make_face()
    extrude(amount=-RESSALTO_EXTRUS_O16_DEPTH)

    # Esboço9 → Ressalto-extrusão17 (add)
    with BuildSketch(Plane.XY.offset(5.4)):
        with BuildLine():
            Line((6.878491341, 12.68612797), (5.981708751, 15.569921721))
            ThreePointArc((5.981708751, 15.569921721), (3.782180648, 16.725958922), (2.626143448, 14.526430819))
            Line((2.626143448, 14.526430819), (3.522926038, 11.642637068))
            Line((3.522926038, 11.642637068), (6.878491341, 12.68612797))
        make_face()
    extrude(amount=-RESSALTO_EXTRUS_O17_DEPTH)

    # Esboço10 → Ressalto-extrusão18 (add)
    with BuildSketch(Plane.XY.offset(6.4).offset(RESSALTO_EXTRUS_O18_START)):
        with Locations((4.303926099, 15.04817627)):
            Circle(ESBO_O10_R)
    extrude(amount=RESSALTO_EXTRUS_O18_DEPTH)

    # Esboço11 → Ressalto-extrusão19 (add)
    with BuildSketch(Plane(origin=(0, 0, 0), x_dir=(-1, 0, 0), z_dir=(0, 0, -1))):
        with Locations((-4.303926099, 15.04817627)):
            Circle(ESBO_O11_R)
    extrude(amount=-RESSALTO_EXTRUS_O19_DEPTH)

    # Esboço12 → Ressalto-extrusão20 (add)
    with BuildSketch(Plane.XY.offset(6.4)):
        with Locations((4.303926099, 15.04817627)):
            Circle(ESBO_O12_R)
    extrude(amount=-RESSALTO_EXTRUS_O20_DEPTH)

    # Esboço13 → Ressalto-extrusão21 (add)
    with BuildSketch(Plane.XY.offset(1.43)):
        with Locations((4.303926099, 15.04817627)):
            Circle(ESBO_O13_R)
    extrude(amount=RESSALTO_EXTRUS_O21_DEPTH)

    # Filete1
    filete1_edges = [body_2.edges().sort_by_distance(p)[0] for p in [
        (1.631368517, 15.04817627, 1.43),
        (1.631368517, 15.04817627, 4.93),
    ]]
    fillet(filete1_edges, radius=FILETE1_R)


solid = Compound([part.part, body_2.part])
